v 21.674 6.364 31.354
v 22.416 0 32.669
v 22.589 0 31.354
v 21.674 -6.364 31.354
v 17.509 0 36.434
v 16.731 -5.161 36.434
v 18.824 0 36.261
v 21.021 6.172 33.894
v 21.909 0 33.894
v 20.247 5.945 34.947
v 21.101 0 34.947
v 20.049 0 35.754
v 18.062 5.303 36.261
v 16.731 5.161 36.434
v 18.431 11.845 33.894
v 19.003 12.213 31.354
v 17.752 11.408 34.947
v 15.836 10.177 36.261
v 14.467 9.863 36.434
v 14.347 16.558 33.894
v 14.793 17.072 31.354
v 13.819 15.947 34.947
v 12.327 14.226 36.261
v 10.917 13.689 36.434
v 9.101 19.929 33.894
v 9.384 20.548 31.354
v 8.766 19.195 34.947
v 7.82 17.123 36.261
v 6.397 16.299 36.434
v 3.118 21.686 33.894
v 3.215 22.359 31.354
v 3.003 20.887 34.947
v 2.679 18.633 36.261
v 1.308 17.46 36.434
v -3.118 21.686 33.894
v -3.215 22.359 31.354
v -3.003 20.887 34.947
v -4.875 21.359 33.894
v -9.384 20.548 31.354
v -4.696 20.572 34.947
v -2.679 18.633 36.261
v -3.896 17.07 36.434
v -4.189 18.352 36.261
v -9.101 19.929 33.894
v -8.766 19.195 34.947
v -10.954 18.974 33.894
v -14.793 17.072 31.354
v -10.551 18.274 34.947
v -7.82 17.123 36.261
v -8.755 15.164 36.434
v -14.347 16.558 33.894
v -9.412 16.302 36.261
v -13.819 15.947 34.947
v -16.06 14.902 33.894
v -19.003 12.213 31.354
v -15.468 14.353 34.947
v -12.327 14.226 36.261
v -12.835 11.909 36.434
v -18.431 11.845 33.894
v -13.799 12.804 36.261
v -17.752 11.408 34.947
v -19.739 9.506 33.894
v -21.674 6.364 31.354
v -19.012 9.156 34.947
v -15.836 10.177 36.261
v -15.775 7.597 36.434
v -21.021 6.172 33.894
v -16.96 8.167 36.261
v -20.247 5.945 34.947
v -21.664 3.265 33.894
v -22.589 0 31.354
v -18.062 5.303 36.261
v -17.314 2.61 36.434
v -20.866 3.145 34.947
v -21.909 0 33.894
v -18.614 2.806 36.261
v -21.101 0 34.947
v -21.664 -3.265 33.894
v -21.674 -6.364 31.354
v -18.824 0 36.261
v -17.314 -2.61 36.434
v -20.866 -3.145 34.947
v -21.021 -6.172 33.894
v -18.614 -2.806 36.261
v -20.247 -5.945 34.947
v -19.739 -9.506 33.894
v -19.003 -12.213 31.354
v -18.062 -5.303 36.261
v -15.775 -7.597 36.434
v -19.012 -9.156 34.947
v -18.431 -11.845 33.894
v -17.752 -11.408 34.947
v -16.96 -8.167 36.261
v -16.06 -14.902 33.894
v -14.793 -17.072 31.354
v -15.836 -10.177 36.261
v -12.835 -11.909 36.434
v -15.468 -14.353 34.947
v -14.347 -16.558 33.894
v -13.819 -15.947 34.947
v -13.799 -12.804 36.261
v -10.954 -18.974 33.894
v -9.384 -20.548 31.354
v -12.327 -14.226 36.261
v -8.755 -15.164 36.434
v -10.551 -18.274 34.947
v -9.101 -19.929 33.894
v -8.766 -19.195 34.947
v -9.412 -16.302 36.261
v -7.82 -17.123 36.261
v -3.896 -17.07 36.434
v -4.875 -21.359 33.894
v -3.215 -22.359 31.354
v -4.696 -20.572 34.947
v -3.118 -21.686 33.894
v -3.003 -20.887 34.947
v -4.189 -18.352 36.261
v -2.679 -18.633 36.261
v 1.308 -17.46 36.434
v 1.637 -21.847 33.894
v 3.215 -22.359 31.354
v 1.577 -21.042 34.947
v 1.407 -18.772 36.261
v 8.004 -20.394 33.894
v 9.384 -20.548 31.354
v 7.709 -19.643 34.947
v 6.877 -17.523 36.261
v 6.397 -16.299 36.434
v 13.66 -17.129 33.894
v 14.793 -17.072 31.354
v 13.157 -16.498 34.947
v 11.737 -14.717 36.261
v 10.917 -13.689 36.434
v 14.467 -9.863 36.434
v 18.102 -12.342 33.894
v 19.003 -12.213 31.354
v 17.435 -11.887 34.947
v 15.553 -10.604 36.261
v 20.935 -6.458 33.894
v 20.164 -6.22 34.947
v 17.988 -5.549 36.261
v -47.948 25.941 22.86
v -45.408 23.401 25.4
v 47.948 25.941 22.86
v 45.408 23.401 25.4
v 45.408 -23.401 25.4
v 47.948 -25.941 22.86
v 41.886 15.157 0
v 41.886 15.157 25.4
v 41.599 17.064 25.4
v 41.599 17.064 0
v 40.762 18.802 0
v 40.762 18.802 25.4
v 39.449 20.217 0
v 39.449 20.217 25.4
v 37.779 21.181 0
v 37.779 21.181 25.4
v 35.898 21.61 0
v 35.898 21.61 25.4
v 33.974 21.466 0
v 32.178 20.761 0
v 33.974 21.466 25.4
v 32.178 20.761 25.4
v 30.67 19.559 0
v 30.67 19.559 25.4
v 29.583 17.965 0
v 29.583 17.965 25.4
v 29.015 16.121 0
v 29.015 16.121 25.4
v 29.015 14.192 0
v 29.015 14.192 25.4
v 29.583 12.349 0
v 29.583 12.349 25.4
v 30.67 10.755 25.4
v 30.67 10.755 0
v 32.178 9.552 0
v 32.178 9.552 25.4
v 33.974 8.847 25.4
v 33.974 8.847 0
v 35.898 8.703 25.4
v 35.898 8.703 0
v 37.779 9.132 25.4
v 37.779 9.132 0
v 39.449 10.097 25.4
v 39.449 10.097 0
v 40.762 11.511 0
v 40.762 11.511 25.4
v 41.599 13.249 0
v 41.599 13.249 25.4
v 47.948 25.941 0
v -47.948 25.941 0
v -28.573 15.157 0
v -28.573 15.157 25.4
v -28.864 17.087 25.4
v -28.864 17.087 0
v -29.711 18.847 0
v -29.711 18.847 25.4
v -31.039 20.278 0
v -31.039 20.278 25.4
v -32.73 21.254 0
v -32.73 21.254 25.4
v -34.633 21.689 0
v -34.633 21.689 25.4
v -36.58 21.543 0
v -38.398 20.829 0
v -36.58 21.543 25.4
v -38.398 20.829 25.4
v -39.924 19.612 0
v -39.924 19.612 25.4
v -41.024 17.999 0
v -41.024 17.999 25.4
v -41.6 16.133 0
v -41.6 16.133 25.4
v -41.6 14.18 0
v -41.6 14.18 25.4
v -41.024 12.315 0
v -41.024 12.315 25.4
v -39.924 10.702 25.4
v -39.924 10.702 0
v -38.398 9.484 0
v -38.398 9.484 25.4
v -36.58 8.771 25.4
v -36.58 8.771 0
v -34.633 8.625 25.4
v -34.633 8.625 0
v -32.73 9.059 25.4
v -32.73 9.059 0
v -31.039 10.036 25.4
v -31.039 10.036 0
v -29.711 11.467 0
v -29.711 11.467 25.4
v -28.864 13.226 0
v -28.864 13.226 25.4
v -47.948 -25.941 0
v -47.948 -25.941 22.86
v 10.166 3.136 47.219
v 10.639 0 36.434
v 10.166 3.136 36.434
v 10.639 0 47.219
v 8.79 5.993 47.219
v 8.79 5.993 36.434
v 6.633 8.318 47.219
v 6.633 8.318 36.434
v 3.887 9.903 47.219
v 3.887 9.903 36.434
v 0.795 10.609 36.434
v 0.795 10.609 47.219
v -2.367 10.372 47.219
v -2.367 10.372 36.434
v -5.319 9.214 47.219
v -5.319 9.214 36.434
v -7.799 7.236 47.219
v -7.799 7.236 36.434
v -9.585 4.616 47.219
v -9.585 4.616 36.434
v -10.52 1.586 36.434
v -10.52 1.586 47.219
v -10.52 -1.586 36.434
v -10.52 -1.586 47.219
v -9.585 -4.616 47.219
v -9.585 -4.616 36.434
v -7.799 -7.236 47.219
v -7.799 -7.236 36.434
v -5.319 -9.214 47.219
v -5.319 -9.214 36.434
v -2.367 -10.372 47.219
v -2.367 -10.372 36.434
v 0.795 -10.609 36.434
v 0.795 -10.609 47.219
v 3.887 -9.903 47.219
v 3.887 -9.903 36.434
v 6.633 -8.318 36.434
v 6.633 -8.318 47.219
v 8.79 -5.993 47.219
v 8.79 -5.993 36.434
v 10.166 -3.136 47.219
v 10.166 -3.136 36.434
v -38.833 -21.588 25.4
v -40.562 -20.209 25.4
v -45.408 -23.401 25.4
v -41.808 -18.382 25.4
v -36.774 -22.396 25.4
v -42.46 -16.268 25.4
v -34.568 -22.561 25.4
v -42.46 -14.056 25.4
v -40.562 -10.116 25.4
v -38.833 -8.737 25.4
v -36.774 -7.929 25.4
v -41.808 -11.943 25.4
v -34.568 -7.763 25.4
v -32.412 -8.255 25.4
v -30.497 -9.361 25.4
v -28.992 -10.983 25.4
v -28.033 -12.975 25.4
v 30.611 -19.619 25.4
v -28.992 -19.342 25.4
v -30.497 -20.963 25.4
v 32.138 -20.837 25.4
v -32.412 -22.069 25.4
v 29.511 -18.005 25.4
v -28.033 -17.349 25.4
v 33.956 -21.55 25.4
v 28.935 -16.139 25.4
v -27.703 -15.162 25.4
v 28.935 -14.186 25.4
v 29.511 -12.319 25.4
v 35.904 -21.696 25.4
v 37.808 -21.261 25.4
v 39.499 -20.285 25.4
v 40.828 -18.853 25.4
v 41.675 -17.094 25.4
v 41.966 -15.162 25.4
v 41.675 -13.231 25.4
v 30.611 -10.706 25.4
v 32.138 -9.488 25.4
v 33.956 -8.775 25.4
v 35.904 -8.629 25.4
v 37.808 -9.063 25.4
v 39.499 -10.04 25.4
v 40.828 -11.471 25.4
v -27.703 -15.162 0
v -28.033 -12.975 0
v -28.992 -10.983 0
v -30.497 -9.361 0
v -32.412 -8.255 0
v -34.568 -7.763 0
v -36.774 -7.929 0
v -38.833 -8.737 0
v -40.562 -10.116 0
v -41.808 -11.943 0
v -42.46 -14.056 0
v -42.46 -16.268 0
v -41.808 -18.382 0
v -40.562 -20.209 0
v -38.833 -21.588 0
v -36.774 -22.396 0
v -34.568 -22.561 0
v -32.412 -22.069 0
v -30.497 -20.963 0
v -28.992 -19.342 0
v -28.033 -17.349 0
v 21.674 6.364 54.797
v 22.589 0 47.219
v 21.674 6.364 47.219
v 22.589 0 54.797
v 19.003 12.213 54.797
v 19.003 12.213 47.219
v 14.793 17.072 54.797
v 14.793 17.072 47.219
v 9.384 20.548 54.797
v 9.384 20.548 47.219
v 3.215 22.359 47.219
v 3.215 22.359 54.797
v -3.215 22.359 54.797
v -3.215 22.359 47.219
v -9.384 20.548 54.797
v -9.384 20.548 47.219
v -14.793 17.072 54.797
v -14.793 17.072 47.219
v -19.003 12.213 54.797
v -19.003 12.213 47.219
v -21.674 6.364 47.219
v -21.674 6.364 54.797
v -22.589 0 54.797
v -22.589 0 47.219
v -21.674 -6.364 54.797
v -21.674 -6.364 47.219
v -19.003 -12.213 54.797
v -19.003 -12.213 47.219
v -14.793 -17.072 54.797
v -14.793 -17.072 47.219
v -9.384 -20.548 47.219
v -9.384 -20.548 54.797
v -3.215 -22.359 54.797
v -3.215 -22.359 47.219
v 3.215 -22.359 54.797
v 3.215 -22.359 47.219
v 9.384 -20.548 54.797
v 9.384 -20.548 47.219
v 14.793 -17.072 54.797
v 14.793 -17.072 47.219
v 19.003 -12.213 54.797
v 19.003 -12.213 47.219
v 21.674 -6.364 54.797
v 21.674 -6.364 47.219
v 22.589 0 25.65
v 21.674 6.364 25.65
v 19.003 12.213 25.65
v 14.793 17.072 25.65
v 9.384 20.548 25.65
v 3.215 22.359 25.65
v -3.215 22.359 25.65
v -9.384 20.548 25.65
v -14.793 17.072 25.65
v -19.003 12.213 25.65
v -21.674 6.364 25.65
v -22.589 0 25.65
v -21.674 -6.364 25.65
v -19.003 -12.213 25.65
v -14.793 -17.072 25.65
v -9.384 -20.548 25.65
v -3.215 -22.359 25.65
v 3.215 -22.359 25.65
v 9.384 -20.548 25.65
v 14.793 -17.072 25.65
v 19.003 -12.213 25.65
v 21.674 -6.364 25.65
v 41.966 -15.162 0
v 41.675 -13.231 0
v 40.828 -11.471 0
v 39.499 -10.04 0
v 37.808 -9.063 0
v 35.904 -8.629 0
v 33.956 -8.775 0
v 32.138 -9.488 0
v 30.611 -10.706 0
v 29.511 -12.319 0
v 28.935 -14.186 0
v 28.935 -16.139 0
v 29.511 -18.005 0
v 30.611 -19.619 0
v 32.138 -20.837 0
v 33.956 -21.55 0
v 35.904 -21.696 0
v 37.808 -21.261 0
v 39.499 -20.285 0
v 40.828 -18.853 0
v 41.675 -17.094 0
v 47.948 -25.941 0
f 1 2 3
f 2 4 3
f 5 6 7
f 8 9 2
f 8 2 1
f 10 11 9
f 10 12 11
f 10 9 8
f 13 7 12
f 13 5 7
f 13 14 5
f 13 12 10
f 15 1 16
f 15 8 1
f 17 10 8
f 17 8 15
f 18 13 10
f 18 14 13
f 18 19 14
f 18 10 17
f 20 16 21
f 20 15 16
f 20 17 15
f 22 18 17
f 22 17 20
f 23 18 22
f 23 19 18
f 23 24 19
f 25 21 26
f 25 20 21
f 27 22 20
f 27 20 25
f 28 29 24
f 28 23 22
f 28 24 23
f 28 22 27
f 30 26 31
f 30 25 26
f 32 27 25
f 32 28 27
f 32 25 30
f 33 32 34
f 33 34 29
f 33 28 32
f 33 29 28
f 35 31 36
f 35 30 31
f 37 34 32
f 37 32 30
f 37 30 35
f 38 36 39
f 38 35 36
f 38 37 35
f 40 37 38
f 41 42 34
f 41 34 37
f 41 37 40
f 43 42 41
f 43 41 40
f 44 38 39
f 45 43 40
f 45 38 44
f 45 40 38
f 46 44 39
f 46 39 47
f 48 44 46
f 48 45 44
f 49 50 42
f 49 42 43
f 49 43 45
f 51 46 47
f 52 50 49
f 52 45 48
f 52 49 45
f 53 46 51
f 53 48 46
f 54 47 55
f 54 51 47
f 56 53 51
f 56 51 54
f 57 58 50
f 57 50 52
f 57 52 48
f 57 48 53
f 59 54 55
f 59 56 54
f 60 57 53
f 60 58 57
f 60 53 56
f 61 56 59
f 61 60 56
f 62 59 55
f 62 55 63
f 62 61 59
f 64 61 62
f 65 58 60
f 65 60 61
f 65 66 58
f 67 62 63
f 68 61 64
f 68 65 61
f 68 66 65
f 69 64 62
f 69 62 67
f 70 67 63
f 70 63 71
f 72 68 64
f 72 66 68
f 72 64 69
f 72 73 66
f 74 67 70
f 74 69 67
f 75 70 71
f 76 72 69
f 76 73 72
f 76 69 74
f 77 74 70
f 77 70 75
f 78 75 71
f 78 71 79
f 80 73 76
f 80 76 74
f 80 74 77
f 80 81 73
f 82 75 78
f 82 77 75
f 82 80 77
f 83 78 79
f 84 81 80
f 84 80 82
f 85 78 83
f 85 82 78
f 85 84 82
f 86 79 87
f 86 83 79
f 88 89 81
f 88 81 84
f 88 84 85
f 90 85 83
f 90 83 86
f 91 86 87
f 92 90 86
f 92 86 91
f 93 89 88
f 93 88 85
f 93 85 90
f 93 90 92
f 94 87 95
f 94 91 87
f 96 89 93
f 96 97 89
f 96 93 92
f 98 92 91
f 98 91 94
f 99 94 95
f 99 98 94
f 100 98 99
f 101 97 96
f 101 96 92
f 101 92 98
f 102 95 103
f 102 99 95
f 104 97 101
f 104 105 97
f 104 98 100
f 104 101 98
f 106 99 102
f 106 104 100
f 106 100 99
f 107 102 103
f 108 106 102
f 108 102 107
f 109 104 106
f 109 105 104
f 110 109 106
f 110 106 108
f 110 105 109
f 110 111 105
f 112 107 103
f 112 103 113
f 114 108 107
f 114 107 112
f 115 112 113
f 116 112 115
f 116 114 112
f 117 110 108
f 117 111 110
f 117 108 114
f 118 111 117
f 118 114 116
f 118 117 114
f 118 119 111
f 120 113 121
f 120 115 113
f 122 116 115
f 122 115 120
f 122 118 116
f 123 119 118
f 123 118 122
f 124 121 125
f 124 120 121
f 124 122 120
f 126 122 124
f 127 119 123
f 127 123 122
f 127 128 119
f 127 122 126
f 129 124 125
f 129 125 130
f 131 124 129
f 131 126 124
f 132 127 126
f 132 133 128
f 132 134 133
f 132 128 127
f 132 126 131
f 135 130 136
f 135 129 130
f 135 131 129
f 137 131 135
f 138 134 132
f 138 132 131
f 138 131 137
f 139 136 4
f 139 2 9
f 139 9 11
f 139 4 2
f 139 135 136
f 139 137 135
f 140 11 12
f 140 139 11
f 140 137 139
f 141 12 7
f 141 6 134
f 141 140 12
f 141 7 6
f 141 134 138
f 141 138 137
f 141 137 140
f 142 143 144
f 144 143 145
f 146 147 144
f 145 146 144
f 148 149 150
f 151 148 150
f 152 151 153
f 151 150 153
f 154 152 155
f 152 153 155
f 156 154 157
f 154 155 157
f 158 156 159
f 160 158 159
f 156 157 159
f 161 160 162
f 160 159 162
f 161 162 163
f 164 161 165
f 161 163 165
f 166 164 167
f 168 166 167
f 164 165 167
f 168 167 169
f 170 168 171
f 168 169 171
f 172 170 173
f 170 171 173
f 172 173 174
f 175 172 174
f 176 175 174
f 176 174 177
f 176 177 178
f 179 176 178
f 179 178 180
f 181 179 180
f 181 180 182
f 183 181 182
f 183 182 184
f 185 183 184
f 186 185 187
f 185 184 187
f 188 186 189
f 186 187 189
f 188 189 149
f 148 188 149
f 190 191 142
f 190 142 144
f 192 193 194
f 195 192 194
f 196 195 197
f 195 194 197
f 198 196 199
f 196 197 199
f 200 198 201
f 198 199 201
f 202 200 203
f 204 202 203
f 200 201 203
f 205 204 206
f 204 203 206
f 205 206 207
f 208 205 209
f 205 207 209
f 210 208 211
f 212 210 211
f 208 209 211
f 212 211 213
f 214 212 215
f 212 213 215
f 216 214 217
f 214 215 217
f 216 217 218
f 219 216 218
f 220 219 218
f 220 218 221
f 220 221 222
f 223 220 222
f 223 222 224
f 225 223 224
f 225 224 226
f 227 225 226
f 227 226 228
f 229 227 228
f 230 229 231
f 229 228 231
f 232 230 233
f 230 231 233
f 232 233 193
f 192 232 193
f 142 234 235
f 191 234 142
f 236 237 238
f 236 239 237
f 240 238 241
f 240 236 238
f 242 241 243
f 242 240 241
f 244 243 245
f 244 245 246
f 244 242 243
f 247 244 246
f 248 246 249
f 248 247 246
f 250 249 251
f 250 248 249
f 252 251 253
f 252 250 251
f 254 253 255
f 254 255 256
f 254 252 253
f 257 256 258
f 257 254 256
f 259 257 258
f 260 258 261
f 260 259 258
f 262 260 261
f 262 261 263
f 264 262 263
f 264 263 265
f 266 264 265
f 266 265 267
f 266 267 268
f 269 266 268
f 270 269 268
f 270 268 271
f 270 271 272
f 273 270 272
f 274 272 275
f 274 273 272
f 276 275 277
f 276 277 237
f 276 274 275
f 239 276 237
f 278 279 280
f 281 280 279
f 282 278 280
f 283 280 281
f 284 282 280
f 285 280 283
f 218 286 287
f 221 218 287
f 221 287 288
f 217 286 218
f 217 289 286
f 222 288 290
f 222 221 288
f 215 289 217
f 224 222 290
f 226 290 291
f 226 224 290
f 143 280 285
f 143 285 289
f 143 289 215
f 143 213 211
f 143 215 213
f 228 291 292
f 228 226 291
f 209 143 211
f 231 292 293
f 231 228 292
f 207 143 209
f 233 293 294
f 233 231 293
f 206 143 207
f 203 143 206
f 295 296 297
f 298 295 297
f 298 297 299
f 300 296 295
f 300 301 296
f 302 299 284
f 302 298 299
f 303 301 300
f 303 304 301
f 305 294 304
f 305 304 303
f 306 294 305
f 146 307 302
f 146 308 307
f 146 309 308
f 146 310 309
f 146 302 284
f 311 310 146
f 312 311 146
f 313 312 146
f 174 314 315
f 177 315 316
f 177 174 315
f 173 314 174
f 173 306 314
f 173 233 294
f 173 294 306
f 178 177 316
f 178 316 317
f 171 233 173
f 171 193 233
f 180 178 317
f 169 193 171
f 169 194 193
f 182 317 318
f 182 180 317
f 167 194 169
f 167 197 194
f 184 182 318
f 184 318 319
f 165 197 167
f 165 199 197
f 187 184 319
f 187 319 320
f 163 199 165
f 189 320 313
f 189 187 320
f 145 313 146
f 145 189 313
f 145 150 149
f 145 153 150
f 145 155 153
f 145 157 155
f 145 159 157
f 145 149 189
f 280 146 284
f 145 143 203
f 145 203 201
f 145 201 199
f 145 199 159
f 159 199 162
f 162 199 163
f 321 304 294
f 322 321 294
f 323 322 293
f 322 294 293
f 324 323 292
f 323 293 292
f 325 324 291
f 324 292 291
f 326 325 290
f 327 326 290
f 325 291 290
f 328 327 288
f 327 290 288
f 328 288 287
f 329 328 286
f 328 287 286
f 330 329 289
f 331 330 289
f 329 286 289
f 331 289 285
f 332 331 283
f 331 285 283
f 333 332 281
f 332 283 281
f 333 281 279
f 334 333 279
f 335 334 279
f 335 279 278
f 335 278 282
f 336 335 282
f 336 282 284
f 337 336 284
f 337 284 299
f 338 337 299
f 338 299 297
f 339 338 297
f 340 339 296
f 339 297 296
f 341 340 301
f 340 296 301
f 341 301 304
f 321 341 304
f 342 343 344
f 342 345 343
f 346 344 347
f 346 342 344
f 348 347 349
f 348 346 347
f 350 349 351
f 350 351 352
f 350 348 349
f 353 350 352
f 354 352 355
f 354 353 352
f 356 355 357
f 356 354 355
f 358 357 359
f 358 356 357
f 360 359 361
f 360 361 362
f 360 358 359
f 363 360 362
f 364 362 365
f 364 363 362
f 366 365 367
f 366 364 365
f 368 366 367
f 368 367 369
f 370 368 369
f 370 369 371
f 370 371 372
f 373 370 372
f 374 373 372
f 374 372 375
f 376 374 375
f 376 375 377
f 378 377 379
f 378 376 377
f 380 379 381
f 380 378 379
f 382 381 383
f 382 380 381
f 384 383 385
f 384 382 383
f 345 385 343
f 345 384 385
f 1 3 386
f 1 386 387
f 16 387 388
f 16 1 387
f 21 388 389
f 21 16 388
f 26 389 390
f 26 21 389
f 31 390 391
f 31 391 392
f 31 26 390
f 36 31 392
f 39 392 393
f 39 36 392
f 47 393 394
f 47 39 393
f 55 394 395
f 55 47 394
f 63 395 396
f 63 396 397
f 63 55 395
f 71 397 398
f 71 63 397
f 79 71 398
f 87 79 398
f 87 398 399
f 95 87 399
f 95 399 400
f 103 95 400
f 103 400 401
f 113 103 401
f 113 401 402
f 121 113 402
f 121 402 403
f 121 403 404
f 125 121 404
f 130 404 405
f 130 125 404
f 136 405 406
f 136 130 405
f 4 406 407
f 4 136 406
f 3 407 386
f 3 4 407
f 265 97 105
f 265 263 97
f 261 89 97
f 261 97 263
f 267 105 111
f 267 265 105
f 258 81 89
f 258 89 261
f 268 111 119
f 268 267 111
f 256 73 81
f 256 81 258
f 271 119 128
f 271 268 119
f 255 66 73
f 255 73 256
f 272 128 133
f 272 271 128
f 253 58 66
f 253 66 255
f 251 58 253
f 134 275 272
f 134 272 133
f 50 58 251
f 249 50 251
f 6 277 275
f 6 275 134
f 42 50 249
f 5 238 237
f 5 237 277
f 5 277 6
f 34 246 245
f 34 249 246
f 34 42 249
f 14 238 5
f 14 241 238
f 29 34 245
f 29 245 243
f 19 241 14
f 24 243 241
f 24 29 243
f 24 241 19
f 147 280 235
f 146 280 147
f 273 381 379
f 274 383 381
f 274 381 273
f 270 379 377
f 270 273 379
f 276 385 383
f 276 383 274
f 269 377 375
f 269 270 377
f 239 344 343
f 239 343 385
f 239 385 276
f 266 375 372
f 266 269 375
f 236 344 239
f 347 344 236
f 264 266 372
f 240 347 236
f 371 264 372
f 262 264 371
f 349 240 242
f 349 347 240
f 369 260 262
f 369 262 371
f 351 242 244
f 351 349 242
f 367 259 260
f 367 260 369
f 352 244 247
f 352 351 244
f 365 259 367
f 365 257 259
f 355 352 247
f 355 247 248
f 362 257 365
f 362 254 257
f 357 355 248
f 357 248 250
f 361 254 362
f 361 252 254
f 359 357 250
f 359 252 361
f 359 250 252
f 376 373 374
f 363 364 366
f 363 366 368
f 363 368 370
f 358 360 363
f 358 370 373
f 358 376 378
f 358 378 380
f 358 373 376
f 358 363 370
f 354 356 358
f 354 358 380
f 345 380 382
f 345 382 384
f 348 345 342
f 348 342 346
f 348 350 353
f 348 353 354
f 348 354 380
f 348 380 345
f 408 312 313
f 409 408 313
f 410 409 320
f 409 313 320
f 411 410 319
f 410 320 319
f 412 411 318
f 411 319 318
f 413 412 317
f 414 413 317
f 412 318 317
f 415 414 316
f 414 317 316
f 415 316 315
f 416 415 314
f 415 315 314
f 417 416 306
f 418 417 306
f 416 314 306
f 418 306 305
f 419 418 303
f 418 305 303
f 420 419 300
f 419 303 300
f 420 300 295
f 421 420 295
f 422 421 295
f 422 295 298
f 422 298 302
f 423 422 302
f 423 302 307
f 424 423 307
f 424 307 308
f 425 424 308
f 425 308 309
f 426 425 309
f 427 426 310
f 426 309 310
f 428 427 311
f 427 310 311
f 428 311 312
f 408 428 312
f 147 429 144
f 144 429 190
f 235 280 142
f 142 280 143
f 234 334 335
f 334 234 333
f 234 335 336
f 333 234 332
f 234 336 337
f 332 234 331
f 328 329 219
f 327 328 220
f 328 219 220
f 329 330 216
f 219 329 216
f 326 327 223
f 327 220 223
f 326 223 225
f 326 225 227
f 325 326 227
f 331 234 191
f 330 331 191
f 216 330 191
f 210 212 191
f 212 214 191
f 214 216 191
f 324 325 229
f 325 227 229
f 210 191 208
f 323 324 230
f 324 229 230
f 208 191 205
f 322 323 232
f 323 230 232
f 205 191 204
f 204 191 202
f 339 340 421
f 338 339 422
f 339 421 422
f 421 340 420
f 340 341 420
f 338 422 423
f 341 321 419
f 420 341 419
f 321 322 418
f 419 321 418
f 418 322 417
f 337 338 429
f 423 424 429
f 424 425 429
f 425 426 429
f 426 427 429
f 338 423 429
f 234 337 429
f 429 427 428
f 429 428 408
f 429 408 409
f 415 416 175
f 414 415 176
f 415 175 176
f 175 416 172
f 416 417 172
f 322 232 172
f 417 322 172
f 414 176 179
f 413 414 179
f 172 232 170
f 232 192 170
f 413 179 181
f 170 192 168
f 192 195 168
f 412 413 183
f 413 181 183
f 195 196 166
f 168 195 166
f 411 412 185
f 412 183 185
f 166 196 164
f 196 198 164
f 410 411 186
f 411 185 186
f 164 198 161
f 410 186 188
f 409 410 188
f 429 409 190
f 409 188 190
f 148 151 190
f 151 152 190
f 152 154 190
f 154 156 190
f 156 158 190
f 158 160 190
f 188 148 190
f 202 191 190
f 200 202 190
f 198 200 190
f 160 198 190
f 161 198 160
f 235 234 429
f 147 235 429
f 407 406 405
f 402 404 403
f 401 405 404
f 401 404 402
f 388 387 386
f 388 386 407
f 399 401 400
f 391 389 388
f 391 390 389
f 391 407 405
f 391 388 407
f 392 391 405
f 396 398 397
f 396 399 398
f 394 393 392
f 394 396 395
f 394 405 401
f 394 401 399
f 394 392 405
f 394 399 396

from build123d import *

# Parameters (mm, degrees)
F0_W     = 95.89541
F0_H     = 51.882624
F1_DEPTH = 25.4
F2_R     = 6.550096
F2_R_2   = 6.471805
F2_R_3   = 6.552092
F2_R_4   = 7.419752
F3_DEPTH = 25.4
F5_SIZE  = 2.54
F7_R     = 5.08


with BuildPart() as f1:
    # F0 (on Top) → F1 (new body)
    with BuildSketch(Plane.XY):
        Rectangle(F0_W, F0_H)
    extrude(amount=F1_DEPTH)

    # F2 (on face) → F3 (cut)
    with BuildSketch(Plane.XY.offset(25.4)):
        with Locations((-35.122789, 15.156721)):
            Circle(F2_R)
        with Locations((35.414264, 15.156721)):
            Circle(F2_R_2)
        with Locations((35.414264, -15.162325)):
            Circle(F2_R_3)
        with Locations((-35.122789, -15.162325)):
            Circle(F2_R_4)
    extrude(amount=-F3_DEPTH, mode=Mode.SUBTRACT)

    # F5
    f5_edges = [f1.edges().sort_by_distance(p)[0] for p in [
        (0, -25.941312, 25.4),
        (-47.947705, 0, 25.4),
        (47.947705, 0, 25.4),
        (0, 25.941312, 25.4),
    ]]
    chamfer(f5_edges, length=F5_SIZE)


with BuildPart() as f6:
    # F4 (on Front) → F6 (revolve)
    with BuildSketch(Plane.XZ):
        Polygon((0, 54.797381), (0, 25.649836), (22.589343, 25.649836), (22.589343, 36.434427), (10.638852, 36.434427), (10.638852, 47.219023), (22.589343, 47.219023), (22.589343, 54.797381), align=None)
    revolve(axis=Axis((0, 0, 27.398691), (0, 0, 1)))

    # F7
    f7_edges = [f6.edges().sort_by_distance(p)[0] for p in [
        (-22.589343, 0, 36.434427),
    ]]
    fillet(f7_edges, radius=F7_R)


solid = Compound([f1.part, f6.part])
